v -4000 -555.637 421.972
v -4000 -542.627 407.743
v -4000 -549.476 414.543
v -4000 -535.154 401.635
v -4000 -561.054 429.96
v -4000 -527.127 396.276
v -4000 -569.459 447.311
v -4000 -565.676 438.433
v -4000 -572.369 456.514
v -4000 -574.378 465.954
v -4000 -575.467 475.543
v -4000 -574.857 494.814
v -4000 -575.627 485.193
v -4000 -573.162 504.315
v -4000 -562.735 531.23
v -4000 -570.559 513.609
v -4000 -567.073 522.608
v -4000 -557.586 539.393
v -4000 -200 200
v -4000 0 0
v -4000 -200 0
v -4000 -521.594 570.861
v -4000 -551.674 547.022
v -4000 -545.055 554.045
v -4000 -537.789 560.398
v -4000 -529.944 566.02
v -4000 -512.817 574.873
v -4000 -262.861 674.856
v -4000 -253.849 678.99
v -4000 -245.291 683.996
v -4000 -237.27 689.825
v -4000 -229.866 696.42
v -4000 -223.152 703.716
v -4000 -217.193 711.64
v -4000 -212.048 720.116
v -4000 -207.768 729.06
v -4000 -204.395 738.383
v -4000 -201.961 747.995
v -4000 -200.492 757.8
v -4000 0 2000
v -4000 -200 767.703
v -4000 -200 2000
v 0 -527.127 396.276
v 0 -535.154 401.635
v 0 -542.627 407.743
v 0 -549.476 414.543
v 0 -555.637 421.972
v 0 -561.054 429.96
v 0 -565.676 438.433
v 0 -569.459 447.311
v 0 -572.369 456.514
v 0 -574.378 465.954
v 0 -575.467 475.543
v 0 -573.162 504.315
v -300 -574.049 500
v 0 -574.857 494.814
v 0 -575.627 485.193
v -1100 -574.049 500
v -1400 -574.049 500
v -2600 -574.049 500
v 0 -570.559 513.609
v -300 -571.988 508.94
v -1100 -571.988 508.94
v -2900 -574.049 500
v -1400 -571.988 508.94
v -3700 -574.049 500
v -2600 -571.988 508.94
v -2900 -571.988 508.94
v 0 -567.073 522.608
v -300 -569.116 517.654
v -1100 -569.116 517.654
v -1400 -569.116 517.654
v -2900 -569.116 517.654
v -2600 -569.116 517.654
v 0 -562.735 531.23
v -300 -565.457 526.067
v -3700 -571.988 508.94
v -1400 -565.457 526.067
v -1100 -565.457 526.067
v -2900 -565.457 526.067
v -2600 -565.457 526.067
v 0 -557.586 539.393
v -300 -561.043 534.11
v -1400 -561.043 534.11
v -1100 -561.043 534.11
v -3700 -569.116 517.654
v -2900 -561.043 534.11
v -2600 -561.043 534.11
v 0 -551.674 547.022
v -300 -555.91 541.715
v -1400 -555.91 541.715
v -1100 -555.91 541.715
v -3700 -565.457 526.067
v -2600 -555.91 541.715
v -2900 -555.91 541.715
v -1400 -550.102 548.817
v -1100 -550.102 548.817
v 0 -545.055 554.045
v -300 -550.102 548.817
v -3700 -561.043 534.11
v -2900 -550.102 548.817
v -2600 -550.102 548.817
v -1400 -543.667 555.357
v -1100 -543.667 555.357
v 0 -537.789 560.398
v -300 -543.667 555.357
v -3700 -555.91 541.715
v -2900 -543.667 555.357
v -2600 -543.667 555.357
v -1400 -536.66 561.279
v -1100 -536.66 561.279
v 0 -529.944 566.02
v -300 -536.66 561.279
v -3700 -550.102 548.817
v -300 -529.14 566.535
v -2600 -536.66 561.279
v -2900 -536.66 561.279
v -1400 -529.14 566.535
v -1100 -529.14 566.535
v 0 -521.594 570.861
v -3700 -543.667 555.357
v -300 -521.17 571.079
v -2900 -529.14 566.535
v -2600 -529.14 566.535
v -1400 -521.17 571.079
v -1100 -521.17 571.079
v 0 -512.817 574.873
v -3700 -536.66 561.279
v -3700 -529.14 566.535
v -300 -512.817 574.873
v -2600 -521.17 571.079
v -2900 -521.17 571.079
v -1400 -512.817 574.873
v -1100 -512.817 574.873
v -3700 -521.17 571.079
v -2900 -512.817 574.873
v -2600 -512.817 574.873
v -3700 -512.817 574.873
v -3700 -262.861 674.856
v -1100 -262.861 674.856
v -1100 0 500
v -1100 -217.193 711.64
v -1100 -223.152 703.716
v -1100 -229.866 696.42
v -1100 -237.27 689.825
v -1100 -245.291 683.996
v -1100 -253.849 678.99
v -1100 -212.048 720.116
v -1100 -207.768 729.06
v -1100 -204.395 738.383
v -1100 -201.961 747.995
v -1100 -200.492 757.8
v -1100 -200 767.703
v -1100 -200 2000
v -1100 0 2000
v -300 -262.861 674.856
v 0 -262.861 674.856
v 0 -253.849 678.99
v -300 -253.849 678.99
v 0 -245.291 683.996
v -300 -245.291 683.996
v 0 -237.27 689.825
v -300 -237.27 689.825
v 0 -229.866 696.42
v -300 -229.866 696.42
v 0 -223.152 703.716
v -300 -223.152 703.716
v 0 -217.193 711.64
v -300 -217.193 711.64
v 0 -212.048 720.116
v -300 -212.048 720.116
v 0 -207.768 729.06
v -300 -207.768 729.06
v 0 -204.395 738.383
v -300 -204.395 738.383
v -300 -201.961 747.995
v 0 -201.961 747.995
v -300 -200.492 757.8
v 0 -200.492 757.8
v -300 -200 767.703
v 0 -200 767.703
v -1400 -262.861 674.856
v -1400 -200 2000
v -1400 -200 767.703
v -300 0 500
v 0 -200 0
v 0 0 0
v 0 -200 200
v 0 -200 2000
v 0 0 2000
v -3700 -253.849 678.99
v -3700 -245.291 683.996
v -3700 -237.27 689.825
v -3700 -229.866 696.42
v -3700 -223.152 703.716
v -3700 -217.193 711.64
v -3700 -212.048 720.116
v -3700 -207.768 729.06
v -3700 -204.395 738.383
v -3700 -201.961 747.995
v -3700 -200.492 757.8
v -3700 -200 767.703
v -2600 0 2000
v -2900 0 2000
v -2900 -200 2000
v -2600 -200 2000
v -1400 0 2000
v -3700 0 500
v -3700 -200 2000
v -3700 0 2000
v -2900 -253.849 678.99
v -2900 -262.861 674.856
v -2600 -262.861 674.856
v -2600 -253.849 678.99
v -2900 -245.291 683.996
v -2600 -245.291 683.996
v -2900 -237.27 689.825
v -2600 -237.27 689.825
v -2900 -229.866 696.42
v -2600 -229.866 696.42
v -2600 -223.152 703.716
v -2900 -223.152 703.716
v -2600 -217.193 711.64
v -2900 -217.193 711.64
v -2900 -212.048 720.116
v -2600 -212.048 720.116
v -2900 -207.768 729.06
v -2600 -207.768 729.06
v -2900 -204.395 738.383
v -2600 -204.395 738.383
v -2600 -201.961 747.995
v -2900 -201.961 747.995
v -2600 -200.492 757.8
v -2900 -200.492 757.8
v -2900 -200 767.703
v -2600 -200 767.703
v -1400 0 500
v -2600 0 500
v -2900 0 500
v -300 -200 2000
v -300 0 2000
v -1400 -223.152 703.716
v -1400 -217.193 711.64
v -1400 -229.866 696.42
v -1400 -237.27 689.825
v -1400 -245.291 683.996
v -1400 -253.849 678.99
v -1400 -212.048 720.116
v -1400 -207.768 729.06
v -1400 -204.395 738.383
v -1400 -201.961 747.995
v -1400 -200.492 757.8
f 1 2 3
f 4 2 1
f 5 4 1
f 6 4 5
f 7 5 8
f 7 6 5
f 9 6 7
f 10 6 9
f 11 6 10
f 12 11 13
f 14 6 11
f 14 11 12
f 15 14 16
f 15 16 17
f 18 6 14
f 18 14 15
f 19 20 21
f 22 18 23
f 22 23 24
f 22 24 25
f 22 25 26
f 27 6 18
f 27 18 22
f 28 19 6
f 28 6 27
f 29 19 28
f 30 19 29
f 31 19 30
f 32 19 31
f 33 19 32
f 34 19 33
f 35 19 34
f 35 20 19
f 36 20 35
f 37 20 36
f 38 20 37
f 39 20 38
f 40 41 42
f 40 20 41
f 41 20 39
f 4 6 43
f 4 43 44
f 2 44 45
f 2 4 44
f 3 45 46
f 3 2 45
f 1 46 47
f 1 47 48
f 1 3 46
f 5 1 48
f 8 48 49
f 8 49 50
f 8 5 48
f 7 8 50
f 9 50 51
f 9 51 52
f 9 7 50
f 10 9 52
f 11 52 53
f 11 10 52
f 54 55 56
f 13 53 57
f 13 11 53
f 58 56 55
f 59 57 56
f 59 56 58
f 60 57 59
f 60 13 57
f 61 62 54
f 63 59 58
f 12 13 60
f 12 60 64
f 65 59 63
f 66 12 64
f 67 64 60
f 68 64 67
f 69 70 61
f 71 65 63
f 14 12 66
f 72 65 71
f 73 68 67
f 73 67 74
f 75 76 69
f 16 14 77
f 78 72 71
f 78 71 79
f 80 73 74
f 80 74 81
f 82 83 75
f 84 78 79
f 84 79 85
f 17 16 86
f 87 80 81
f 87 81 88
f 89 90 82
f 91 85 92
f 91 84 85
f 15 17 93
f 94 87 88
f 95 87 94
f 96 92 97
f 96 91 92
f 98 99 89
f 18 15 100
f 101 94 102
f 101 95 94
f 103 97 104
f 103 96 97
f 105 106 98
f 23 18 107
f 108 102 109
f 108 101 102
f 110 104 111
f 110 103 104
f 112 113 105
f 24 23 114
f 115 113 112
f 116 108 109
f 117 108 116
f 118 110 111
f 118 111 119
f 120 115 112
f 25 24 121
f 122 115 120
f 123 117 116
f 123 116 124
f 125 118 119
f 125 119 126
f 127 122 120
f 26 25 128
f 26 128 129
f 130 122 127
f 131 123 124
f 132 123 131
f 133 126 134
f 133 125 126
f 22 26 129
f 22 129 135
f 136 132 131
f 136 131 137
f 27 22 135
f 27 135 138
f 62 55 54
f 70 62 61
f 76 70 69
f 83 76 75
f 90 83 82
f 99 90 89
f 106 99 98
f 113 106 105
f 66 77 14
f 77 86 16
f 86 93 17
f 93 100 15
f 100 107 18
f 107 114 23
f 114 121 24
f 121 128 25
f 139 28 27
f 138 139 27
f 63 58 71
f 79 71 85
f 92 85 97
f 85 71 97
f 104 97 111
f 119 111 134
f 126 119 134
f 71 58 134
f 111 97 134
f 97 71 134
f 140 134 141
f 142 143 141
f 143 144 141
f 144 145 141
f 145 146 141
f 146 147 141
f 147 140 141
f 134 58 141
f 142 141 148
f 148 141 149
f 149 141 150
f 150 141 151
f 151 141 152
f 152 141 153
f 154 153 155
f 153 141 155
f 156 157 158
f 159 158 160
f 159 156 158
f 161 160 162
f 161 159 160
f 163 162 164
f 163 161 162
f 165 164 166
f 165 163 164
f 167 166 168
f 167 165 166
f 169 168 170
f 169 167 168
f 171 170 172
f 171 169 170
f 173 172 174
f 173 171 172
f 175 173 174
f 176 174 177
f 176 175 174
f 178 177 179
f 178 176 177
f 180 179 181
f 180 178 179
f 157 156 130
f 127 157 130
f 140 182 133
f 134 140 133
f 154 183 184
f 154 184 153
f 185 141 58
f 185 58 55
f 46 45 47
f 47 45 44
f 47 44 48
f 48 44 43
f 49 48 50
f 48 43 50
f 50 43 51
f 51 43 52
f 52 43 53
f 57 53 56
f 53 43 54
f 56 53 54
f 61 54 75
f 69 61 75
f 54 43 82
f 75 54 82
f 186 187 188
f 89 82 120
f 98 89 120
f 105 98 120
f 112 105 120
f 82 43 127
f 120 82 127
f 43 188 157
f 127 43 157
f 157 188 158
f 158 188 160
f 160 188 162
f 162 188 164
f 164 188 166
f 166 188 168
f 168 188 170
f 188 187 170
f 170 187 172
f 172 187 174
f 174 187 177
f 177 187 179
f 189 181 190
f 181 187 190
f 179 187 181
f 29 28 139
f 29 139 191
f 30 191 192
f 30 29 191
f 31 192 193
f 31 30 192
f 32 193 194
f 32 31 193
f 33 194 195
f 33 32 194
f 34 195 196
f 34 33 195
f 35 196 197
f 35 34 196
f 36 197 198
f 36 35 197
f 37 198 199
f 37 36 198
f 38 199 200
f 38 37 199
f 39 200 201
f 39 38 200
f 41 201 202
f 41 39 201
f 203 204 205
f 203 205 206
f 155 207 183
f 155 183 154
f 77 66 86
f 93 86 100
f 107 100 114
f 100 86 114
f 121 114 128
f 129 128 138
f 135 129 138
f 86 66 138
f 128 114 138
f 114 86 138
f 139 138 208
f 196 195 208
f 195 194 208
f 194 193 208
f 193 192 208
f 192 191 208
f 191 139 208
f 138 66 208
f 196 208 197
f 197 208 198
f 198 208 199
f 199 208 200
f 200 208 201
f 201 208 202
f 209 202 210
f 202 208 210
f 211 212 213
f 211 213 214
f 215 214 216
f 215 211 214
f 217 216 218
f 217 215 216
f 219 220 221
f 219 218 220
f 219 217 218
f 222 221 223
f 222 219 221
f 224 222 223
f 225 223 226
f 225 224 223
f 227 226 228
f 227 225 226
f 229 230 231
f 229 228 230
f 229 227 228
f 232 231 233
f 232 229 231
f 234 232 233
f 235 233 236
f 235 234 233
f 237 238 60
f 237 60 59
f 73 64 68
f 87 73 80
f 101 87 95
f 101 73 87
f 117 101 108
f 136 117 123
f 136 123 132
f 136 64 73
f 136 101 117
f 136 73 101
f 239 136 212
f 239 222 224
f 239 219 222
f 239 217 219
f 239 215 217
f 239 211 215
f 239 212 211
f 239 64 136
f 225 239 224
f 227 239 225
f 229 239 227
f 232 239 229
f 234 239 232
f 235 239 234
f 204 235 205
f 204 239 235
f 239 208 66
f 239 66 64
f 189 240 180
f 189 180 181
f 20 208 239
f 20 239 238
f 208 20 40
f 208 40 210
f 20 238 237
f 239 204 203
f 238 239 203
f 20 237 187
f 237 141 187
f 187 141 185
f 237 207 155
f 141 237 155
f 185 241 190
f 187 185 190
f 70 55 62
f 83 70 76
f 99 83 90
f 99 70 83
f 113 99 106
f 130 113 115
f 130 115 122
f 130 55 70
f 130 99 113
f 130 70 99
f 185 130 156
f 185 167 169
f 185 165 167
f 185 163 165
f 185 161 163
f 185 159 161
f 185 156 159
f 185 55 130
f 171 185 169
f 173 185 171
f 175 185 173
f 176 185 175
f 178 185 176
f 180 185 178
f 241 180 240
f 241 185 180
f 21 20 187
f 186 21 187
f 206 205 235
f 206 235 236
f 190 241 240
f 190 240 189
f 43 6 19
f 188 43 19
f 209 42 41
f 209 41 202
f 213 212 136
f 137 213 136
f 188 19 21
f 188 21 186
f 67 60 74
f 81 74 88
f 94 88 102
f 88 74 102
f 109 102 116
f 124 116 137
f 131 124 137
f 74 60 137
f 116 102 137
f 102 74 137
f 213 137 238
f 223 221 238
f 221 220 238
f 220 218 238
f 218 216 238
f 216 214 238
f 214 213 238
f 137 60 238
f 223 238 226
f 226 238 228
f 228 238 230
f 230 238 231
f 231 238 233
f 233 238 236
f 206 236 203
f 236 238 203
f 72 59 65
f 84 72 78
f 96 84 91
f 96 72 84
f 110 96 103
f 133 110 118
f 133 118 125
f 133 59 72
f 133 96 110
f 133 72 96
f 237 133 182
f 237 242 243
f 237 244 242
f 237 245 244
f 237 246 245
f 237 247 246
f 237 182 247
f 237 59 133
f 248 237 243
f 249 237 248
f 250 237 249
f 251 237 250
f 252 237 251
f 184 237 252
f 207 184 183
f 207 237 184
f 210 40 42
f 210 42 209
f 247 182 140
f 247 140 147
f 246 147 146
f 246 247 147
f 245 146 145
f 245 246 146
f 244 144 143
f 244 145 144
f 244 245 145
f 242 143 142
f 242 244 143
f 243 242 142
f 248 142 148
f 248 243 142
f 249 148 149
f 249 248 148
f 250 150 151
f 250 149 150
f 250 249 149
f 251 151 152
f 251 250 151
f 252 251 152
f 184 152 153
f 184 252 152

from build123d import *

# Parameters (mm, degrees)
F0_W     = 4000
F0_H     = 2000
F1_DEPTH = 200
F3_DEPTH = 4000
F4_R     = 100
F5_R     = 100
F6_W     = 800
F6_H     = 1500
F6_W_2   = 1200
F7_DEPTH = 575.6786659604


with BuildPart() as f1:
    # F0 (on Front) → F1 (new body)
    with BuildSketch(Plane.XZ):
        with Locations((-2000, 1000)):
            Rectangle(F0_W, F0_H)
    extrude(amount=F1_DEPTH)

    # F2 (on Right) → F3 (join, through all)
    with BuildSketch(Plane.YZ):
        Polygon((-700, 500), (-200, 200), (-200, 700), align=None)
    extrude(amount=-F3_DEPTH)

    # F4
    f4_edges = [f1.edges().sort_by_distance(p)[0] for p in [
        (-2000, -700, 500),
    ]]
    fillet(f4_edges, radius=F4_R)

    # F5
    f5_edges = [f1.edges().sort_by_distance(p)[0] for p in [
        (-2000, -200, 700),
    ]]
    fillet(f5_edges, radius=F5_R)

    # F6 (on face) → F7 (cut, through all)
    with BuildSketch(Plane.XZ):
        with Locations((-700, 1250)):
            Rectangle(F6_W, F6_H)
        with Locations((-2000, 1250)):
            Rectangle(F6_W_2, F6_H)
        with Locations((-3300, 1250)):
            Rectangle(F6_W, F6_H)
    extrude(amount=F7_DEPTH, mode=Mode.SUBTRACT)


solid = f1.part
